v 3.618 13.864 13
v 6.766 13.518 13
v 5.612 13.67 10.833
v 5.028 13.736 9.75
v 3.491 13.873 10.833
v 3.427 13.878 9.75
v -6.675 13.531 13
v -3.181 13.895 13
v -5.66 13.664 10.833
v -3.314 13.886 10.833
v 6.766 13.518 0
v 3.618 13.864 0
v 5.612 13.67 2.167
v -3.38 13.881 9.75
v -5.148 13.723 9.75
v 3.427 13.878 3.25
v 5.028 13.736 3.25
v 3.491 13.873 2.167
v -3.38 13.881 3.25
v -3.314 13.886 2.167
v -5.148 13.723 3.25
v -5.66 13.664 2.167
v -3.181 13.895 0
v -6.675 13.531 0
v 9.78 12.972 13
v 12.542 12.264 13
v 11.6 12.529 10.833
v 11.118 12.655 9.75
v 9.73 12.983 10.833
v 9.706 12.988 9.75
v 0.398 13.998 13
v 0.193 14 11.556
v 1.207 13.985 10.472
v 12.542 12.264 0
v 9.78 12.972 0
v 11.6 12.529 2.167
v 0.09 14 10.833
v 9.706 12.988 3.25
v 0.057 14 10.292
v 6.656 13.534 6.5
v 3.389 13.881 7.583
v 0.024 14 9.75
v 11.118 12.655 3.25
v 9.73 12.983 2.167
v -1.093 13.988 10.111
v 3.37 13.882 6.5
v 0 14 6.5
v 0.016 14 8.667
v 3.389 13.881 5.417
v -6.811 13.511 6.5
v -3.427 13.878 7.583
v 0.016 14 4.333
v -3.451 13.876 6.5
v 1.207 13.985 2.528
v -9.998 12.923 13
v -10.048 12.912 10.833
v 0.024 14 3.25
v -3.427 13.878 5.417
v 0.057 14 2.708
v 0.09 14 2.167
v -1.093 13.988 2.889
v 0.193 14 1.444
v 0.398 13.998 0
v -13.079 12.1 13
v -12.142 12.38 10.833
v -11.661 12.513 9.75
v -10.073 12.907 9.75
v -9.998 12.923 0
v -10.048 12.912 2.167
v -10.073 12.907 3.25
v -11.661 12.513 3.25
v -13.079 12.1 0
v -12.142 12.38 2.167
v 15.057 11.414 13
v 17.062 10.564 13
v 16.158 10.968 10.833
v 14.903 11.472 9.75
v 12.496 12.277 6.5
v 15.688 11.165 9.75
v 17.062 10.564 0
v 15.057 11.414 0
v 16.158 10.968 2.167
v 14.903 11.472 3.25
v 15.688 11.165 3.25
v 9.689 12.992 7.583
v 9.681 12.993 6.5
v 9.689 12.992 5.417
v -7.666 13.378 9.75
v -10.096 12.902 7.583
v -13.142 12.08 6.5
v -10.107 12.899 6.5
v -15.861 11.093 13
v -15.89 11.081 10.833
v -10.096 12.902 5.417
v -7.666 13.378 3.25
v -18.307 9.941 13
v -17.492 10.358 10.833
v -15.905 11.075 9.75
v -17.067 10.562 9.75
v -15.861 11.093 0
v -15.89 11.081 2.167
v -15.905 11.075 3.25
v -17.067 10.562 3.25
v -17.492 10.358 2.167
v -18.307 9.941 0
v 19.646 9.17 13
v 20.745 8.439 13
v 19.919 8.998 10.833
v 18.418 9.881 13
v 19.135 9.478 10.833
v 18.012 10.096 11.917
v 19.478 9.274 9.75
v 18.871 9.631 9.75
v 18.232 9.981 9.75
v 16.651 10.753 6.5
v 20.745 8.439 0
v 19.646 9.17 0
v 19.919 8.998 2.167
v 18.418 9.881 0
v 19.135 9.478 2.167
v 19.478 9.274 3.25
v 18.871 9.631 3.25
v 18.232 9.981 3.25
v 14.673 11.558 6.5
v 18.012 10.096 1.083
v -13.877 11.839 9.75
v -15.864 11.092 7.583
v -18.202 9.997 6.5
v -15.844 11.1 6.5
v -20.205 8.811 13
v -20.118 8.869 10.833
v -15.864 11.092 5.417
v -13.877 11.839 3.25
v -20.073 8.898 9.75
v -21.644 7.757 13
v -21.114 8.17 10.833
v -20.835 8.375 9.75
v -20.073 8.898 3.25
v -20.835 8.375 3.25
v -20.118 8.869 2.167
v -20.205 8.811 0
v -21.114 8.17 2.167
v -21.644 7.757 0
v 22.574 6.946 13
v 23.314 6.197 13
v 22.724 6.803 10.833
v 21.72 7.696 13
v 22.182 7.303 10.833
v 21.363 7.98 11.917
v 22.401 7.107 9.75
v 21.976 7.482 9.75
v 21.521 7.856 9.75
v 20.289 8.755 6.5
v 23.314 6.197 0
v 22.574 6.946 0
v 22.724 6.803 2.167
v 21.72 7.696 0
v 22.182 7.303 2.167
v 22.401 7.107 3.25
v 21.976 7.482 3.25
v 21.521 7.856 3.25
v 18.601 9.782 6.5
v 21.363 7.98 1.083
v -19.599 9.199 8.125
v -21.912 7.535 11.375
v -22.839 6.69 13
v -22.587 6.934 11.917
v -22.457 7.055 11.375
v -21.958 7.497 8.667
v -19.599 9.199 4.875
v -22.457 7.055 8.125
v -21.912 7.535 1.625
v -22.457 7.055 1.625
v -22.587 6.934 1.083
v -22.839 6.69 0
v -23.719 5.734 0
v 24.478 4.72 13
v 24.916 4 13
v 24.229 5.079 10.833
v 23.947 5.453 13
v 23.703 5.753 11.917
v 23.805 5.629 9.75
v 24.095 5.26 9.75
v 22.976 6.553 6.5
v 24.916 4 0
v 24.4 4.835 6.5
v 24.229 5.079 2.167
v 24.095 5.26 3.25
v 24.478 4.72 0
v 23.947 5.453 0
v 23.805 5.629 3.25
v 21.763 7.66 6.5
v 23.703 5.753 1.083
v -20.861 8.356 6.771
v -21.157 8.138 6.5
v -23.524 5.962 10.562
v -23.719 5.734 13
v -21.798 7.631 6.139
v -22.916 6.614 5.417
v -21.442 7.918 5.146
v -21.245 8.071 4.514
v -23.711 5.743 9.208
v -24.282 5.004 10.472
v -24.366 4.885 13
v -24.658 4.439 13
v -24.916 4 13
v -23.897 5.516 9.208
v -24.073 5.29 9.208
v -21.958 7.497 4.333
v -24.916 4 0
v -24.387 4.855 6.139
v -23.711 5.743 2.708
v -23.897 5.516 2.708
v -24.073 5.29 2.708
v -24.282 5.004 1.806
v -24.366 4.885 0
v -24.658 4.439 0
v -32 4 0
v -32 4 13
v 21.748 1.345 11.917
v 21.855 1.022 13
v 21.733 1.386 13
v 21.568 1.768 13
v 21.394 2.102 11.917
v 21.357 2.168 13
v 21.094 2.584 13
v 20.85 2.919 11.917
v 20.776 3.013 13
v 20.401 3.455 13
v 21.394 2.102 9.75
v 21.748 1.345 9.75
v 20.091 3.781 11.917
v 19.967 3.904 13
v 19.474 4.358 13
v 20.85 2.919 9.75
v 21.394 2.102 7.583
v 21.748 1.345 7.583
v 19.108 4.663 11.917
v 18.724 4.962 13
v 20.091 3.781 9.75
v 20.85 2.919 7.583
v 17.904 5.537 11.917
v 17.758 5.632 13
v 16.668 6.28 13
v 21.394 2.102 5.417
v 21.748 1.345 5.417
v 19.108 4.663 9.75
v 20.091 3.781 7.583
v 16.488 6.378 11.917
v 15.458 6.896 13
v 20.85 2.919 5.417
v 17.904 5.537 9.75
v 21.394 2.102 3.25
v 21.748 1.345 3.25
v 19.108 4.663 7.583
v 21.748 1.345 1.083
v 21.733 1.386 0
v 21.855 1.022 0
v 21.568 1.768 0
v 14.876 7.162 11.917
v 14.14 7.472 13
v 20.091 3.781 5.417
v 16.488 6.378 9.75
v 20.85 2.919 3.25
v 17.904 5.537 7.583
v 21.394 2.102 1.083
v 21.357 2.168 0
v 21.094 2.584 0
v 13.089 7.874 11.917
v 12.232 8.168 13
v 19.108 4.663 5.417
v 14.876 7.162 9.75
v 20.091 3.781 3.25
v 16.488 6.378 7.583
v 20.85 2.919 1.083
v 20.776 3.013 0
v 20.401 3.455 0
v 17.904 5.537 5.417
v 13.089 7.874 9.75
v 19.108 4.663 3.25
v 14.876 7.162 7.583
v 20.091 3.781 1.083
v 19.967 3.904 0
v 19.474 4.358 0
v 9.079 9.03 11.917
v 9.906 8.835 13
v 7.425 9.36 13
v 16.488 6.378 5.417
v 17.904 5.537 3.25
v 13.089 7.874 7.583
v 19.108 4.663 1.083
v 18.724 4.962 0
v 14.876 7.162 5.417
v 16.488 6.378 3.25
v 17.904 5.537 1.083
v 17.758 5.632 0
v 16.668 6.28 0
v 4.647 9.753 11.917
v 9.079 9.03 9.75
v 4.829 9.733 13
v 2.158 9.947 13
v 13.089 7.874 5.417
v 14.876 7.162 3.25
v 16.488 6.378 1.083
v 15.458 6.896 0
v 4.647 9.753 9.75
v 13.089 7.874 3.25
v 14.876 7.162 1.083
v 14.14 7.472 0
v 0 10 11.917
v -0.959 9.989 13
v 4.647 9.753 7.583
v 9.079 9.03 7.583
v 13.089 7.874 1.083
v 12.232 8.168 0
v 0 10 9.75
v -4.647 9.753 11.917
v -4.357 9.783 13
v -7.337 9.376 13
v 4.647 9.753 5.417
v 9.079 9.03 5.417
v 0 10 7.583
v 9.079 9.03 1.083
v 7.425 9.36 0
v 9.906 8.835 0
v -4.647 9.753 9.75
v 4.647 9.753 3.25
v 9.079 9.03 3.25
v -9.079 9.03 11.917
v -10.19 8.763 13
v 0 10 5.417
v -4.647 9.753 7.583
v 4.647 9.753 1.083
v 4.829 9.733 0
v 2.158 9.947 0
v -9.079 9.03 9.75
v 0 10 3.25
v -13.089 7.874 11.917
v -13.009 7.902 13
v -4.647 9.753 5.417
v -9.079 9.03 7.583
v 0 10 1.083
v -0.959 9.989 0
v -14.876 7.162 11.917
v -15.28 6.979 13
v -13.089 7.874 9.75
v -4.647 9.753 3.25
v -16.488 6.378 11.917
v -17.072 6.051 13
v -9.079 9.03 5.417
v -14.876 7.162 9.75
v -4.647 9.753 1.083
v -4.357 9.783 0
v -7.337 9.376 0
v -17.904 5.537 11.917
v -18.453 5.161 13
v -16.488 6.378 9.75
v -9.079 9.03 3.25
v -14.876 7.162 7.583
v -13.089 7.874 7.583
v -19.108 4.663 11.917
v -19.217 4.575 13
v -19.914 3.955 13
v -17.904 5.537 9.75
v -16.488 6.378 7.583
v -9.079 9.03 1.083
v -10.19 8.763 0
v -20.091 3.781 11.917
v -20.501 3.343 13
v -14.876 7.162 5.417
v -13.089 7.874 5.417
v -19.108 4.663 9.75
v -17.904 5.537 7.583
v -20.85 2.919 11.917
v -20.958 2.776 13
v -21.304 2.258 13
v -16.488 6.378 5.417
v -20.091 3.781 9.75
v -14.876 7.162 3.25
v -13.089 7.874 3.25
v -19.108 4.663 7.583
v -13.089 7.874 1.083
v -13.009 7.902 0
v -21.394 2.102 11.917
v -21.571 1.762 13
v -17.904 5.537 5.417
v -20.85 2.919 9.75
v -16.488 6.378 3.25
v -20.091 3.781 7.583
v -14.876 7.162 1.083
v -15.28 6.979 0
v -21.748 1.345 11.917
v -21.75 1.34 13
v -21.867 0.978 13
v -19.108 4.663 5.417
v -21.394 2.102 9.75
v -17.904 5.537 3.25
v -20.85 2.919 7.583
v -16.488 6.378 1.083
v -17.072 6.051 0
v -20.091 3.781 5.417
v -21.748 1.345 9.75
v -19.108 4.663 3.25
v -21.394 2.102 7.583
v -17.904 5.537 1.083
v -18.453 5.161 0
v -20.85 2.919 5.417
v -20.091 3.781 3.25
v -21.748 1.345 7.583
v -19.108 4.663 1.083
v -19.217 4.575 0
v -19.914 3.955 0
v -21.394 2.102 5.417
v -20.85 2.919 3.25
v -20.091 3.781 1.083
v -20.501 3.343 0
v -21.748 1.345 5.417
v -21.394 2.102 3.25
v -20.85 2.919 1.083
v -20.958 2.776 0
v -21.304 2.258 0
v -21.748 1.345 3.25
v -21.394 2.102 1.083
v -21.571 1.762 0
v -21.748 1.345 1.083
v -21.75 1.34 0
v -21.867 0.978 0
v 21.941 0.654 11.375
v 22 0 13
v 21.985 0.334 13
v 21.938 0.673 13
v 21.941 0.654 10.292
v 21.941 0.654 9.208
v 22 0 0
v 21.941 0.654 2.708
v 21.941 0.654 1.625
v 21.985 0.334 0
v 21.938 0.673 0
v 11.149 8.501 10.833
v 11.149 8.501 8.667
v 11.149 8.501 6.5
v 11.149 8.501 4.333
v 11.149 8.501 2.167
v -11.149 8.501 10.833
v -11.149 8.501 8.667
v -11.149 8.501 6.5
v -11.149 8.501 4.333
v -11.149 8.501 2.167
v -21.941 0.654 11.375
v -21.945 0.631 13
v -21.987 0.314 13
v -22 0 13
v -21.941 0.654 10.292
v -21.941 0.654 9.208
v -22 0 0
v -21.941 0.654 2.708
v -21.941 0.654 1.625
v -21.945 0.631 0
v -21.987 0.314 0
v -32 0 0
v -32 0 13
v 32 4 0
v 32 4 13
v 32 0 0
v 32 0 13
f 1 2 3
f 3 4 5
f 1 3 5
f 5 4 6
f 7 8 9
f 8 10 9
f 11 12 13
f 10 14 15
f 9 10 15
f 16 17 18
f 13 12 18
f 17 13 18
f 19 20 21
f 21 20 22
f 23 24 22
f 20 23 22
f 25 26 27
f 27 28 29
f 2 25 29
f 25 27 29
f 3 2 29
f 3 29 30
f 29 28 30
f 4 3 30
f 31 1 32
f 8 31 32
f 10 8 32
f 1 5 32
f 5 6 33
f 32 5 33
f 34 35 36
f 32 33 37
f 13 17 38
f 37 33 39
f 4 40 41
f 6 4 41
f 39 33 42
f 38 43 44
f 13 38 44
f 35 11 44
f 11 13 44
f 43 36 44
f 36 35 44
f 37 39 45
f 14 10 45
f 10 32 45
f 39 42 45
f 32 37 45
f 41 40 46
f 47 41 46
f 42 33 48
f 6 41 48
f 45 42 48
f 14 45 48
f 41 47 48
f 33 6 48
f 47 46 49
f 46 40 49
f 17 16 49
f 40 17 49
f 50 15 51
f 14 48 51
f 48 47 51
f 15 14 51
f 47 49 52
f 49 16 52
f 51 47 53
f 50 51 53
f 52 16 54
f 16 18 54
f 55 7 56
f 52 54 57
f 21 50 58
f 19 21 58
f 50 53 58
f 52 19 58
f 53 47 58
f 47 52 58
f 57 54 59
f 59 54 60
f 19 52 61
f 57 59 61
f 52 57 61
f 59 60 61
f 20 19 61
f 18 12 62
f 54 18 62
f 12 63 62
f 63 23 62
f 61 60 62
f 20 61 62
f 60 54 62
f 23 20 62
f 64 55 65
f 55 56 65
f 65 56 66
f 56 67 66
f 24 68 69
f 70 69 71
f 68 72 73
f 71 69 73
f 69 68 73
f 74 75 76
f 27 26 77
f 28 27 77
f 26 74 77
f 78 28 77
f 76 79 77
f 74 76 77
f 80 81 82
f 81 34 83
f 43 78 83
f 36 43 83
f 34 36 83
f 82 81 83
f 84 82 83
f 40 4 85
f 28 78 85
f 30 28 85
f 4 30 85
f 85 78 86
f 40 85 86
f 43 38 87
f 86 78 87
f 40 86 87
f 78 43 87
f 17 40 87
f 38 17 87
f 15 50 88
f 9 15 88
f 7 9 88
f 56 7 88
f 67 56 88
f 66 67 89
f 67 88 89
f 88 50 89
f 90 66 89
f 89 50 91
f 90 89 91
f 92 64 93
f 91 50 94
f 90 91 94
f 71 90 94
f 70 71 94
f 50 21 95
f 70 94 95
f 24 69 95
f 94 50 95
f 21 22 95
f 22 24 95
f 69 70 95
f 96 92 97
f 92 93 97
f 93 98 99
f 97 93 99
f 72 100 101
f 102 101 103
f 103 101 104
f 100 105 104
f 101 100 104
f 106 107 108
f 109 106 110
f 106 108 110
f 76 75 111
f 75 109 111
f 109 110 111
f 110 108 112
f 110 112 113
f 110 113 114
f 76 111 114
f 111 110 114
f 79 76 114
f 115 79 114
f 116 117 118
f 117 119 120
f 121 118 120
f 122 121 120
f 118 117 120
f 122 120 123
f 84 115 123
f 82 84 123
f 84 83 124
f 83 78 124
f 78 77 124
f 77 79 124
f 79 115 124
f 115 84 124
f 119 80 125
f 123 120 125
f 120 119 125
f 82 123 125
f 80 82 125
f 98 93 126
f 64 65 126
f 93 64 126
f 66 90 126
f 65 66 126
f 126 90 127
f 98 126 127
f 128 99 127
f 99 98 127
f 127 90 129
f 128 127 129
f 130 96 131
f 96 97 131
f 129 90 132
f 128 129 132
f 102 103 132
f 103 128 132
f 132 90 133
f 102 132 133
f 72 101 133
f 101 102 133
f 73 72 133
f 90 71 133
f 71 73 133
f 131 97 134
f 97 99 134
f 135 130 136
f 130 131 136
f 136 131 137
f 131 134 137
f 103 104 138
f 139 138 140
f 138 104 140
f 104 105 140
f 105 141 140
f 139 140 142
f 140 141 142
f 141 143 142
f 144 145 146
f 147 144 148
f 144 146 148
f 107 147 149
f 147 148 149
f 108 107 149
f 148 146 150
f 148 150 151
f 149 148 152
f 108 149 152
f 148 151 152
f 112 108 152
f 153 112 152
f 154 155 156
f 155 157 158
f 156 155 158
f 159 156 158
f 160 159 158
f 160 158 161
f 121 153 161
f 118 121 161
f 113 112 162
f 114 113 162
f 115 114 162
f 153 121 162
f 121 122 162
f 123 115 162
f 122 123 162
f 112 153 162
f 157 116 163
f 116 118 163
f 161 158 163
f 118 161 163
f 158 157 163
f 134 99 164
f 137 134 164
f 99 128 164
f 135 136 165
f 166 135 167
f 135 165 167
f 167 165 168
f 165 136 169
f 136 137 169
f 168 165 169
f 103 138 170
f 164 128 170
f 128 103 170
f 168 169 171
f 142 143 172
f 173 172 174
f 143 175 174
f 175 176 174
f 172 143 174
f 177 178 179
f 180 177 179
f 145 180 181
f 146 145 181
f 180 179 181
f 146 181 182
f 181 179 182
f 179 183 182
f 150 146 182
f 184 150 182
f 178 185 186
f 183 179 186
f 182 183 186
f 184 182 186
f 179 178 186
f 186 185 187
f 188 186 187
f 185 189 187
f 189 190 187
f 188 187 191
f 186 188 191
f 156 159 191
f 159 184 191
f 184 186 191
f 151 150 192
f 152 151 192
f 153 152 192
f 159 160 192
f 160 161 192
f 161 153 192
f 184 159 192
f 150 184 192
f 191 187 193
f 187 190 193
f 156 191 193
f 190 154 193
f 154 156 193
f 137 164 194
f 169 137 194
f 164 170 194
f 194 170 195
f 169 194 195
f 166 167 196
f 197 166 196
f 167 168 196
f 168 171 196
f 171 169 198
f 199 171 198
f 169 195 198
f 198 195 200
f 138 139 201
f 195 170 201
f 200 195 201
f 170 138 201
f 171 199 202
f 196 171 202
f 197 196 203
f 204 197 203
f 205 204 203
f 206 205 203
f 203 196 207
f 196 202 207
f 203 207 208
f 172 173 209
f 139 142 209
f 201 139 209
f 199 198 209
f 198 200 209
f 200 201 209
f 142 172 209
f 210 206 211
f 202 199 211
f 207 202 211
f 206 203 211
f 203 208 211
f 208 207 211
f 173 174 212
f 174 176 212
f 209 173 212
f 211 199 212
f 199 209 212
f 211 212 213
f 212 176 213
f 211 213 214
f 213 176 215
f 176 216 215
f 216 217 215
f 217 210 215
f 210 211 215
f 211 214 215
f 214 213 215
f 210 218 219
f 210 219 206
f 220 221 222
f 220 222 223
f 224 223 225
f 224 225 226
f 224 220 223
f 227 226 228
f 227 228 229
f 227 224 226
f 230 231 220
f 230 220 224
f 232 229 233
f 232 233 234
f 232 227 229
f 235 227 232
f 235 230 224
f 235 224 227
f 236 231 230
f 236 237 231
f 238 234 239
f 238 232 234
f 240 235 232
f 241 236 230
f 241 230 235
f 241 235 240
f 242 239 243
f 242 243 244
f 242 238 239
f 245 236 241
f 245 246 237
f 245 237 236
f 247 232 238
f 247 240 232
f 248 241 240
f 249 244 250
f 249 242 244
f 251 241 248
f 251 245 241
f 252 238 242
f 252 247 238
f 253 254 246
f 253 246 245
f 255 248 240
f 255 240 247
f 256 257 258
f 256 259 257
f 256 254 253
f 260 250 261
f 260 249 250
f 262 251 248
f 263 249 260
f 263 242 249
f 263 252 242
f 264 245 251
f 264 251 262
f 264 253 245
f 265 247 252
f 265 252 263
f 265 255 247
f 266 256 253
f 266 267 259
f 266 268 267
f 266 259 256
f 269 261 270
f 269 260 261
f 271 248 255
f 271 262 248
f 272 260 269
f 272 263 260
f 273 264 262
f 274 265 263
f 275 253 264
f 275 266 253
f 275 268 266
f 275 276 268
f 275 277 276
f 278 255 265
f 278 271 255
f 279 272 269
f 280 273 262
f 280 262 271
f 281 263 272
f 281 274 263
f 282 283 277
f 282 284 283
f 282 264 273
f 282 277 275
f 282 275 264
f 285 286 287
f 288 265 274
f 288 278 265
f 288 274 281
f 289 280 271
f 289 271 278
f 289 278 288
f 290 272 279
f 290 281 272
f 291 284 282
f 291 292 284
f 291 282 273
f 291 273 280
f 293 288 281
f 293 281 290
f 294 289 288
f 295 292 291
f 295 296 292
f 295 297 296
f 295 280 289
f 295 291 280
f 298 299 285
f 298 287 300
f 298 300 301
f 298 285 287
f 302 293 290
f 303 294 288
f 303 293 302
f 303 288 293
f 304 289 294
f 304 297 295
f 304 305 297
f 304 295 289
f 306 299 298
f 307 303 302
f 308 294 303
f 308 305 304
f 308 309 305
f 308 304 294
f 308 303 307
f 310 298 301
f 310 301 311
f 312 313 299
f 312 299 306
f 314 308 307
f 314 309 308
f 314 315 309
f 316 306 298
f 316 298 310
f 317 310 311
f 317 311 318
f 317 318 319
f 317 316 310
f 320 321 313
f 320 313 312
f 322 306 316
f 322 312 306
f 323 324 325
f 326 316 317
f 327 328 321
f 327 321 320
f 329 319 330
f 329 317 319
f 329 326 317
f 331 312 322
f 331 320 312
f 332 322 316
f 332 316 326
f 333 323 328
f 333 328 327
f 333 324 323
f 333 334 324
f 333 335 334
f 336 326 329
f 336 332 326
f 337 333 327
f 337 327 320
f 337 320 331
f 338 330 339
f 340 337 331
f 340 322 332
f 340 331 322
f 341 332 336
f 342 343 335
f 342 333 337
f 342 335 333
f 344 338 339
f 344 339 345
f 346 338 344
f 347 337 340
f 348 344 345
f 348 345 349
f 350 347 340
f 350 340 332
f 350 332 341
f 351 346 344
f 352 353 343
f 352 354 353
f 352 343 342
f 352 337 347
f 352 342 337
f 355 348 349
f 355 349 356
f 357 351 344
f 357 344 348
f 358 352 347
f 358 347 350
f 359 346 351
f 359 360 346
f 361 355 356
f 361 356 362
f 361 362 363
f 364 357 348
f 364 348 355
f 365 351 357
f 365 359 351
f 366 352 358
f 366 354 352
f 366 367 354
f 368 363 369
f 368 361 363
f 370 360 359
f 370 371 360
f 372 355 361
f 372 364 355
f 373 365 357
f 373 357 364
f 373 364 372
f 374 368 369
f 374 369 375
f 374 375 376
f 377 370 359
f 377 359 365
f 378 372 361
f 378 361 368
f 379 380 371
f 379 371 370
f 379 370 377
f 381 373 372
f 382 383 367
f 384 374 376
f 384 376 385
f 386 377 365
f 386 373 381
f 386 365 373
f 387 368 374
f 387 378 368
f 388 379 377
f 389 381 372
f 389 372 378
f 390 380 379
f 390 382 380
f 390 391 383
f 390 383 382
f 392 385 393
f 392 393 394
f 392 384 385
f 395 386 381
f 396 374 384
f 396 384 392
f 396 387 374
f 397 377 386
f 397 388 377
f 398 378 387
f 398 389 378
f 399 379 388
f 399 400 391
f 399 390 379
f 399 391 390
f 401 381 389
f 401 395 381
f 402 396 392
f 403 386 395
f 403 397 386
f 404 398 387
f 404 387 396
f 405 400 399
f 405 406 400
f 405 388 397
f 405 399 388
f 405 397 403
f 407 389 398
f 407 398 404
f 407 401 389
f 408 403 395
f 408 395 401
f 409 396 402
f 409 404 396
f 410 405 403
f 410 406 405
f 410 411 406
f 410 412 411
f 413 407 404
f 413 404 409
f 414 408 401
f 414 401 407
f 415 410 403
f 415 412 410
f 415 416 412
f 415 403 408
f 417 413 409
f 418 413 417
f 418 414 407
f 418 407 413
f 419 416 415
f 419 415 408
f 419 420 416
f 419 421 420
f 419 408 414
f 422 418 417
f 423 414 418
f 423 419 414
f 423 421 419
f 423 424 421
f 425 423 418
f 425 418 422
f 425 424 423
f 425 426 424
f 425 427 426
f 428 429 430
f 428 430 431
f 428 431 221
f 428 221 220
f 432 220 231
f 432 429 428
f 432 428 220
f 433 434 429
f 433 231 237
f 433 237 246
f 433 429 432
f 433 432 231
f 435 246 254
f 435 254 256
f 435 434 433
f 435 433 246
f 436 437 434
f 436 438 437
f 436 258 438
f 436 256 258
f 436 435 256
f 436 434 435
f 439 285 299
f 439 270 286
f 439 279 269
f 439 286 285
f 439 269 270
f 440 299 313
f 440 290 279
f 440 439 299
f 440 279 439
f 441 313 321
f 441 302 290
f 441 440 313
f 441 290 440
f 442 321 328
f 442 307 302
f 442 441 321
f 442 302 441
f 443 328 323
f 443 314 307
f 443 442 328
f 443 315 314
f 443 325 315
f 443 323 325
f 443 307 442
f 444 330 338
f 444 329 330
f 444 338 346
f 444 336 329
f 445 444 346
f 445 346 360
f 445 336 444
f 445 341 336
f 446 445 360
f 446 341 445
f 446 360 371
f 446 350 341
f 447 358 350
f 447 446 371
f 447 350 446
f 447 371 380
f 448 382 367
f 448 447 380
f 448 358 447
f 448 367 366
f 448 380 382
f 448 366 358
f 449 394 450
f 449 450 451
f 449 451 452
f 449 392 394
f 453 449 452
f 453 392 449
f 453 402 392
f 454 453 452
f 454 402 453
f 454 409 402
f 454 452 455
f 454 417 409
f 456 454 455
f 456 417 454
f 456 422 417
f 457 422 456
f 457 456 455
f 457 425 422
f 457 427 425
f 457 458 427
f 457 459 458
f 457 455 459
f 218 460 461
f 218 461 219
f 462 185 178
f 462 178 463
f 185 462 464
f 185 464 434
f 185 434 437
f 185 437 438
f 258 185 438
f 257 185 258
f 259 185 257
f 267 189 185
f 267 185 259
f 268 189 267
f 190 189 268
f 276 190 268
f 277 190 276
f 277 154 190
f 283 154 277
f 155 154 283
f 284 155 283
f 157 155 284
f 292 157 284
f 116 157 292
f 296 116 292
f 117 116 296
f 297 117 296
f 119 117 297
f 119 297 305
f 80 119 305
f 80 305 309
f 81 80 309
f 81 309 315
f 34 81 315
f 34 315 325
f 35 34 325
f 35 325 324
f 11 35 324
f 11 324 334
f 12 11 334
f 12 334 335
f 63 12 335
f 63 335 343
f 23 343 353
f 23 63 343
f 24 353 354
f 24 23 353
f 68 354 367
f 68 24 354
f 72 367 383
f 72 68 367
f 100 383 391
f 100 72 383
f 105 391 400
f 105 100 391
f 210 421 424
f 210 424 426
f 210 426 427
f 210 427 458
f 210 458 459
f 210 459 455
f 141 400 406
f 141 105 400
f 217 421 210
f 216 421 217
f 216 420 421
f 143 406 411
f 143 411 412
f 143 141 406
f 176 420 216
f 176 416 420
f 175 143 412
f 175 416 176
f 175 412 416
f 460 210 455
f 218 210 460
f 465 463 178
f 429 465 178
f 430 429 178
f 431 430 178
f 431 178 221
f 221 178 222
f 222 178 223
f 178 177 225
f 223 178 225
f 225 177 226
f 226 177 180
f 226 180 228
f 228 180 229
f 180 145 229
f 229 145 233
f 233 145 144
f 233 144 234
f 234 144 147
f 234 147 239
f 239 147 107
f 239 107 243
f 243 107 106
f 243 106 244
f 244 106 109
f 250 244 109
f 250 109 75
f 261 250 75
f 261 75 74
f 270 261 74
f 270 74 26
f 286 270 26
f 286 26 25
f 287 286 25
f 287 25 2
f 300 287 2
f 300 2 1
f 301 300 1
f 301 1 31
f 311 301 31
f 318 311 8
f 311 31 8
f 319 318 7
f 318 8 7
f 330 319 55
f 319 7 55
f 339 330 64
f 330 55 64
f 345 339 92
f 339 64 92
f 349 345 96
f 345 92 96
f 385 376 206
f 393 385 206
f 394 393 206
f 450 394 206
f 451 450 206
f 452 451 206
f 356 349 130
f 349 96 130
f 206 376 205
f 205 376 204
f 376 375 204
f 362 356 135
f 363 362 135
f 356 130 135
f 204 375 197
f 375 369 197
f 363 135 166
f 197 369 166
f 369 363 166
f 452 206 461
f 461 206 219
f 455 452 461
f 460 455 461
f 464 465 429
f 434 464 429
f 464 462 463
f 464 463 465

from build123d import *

# Parameters (mm, degrees)
BOSS_EXTRUDE4_DEPTH = 13


with BuildPart() as part:
    # Sketch1 → Boss-Extrude4 (new body)
    with BuildSketch(Plane.XY):
        with BuildLine():
            Line((-22, 0), (-32, 0))
            Line((-32, 0), (-32, 4))
            Line((-32, 4), (-24.916186035, 4))
            add(Edge.make_bspline(
                [(24.916186035, 4), (0, 49), (-24.916186035, 4)],
                knots=[3.431344355, 3.431344355, 3.431344355, 5.993433606, 5.993433606, 5.993433606], degree=2, weights=[1, 0.285714286, 1]))
            Line((24.916186035, 4), (32, 4))
            Line((32, 4), (32, 0))
            Line((32, 0), (22, 0))
            add(Edge.make_bspline(
                [(22, 0), (22, 0.432036642), (21.854886362, 1.296109926), (20.997387843, 2.886644647), (19.258004947, 4.669386797), (15.741252168, 6.998785757), (9.364361038, 9.328152259), (0, 10.335923871), (-9.364361038, 9.328152259), (-15.741252168, 6.998785757), (-19.258004947, 4.669386797), (-20.997387843, 2.886644647), (-21.854886362, 1.296109926), (-22, 0.432036642), (-22, 0)],
                knots=[3.141592654, 3.141592654, 3.141592654, 3.141592654, 3.337942194, 3.534291735, 3.730641276, 3.926990817, 4.319689899, 4.71238898, 5.105088062, 5.497787144, 5.694136685, 5.890486225, 6.086835766, 6.283185307, 6.283185307, 6.283185307, 6.283185307], degree=3))
        make_face()
    extrude(amount=BOSS_EXTRUDE4_DEPTH)


solid = part.part
